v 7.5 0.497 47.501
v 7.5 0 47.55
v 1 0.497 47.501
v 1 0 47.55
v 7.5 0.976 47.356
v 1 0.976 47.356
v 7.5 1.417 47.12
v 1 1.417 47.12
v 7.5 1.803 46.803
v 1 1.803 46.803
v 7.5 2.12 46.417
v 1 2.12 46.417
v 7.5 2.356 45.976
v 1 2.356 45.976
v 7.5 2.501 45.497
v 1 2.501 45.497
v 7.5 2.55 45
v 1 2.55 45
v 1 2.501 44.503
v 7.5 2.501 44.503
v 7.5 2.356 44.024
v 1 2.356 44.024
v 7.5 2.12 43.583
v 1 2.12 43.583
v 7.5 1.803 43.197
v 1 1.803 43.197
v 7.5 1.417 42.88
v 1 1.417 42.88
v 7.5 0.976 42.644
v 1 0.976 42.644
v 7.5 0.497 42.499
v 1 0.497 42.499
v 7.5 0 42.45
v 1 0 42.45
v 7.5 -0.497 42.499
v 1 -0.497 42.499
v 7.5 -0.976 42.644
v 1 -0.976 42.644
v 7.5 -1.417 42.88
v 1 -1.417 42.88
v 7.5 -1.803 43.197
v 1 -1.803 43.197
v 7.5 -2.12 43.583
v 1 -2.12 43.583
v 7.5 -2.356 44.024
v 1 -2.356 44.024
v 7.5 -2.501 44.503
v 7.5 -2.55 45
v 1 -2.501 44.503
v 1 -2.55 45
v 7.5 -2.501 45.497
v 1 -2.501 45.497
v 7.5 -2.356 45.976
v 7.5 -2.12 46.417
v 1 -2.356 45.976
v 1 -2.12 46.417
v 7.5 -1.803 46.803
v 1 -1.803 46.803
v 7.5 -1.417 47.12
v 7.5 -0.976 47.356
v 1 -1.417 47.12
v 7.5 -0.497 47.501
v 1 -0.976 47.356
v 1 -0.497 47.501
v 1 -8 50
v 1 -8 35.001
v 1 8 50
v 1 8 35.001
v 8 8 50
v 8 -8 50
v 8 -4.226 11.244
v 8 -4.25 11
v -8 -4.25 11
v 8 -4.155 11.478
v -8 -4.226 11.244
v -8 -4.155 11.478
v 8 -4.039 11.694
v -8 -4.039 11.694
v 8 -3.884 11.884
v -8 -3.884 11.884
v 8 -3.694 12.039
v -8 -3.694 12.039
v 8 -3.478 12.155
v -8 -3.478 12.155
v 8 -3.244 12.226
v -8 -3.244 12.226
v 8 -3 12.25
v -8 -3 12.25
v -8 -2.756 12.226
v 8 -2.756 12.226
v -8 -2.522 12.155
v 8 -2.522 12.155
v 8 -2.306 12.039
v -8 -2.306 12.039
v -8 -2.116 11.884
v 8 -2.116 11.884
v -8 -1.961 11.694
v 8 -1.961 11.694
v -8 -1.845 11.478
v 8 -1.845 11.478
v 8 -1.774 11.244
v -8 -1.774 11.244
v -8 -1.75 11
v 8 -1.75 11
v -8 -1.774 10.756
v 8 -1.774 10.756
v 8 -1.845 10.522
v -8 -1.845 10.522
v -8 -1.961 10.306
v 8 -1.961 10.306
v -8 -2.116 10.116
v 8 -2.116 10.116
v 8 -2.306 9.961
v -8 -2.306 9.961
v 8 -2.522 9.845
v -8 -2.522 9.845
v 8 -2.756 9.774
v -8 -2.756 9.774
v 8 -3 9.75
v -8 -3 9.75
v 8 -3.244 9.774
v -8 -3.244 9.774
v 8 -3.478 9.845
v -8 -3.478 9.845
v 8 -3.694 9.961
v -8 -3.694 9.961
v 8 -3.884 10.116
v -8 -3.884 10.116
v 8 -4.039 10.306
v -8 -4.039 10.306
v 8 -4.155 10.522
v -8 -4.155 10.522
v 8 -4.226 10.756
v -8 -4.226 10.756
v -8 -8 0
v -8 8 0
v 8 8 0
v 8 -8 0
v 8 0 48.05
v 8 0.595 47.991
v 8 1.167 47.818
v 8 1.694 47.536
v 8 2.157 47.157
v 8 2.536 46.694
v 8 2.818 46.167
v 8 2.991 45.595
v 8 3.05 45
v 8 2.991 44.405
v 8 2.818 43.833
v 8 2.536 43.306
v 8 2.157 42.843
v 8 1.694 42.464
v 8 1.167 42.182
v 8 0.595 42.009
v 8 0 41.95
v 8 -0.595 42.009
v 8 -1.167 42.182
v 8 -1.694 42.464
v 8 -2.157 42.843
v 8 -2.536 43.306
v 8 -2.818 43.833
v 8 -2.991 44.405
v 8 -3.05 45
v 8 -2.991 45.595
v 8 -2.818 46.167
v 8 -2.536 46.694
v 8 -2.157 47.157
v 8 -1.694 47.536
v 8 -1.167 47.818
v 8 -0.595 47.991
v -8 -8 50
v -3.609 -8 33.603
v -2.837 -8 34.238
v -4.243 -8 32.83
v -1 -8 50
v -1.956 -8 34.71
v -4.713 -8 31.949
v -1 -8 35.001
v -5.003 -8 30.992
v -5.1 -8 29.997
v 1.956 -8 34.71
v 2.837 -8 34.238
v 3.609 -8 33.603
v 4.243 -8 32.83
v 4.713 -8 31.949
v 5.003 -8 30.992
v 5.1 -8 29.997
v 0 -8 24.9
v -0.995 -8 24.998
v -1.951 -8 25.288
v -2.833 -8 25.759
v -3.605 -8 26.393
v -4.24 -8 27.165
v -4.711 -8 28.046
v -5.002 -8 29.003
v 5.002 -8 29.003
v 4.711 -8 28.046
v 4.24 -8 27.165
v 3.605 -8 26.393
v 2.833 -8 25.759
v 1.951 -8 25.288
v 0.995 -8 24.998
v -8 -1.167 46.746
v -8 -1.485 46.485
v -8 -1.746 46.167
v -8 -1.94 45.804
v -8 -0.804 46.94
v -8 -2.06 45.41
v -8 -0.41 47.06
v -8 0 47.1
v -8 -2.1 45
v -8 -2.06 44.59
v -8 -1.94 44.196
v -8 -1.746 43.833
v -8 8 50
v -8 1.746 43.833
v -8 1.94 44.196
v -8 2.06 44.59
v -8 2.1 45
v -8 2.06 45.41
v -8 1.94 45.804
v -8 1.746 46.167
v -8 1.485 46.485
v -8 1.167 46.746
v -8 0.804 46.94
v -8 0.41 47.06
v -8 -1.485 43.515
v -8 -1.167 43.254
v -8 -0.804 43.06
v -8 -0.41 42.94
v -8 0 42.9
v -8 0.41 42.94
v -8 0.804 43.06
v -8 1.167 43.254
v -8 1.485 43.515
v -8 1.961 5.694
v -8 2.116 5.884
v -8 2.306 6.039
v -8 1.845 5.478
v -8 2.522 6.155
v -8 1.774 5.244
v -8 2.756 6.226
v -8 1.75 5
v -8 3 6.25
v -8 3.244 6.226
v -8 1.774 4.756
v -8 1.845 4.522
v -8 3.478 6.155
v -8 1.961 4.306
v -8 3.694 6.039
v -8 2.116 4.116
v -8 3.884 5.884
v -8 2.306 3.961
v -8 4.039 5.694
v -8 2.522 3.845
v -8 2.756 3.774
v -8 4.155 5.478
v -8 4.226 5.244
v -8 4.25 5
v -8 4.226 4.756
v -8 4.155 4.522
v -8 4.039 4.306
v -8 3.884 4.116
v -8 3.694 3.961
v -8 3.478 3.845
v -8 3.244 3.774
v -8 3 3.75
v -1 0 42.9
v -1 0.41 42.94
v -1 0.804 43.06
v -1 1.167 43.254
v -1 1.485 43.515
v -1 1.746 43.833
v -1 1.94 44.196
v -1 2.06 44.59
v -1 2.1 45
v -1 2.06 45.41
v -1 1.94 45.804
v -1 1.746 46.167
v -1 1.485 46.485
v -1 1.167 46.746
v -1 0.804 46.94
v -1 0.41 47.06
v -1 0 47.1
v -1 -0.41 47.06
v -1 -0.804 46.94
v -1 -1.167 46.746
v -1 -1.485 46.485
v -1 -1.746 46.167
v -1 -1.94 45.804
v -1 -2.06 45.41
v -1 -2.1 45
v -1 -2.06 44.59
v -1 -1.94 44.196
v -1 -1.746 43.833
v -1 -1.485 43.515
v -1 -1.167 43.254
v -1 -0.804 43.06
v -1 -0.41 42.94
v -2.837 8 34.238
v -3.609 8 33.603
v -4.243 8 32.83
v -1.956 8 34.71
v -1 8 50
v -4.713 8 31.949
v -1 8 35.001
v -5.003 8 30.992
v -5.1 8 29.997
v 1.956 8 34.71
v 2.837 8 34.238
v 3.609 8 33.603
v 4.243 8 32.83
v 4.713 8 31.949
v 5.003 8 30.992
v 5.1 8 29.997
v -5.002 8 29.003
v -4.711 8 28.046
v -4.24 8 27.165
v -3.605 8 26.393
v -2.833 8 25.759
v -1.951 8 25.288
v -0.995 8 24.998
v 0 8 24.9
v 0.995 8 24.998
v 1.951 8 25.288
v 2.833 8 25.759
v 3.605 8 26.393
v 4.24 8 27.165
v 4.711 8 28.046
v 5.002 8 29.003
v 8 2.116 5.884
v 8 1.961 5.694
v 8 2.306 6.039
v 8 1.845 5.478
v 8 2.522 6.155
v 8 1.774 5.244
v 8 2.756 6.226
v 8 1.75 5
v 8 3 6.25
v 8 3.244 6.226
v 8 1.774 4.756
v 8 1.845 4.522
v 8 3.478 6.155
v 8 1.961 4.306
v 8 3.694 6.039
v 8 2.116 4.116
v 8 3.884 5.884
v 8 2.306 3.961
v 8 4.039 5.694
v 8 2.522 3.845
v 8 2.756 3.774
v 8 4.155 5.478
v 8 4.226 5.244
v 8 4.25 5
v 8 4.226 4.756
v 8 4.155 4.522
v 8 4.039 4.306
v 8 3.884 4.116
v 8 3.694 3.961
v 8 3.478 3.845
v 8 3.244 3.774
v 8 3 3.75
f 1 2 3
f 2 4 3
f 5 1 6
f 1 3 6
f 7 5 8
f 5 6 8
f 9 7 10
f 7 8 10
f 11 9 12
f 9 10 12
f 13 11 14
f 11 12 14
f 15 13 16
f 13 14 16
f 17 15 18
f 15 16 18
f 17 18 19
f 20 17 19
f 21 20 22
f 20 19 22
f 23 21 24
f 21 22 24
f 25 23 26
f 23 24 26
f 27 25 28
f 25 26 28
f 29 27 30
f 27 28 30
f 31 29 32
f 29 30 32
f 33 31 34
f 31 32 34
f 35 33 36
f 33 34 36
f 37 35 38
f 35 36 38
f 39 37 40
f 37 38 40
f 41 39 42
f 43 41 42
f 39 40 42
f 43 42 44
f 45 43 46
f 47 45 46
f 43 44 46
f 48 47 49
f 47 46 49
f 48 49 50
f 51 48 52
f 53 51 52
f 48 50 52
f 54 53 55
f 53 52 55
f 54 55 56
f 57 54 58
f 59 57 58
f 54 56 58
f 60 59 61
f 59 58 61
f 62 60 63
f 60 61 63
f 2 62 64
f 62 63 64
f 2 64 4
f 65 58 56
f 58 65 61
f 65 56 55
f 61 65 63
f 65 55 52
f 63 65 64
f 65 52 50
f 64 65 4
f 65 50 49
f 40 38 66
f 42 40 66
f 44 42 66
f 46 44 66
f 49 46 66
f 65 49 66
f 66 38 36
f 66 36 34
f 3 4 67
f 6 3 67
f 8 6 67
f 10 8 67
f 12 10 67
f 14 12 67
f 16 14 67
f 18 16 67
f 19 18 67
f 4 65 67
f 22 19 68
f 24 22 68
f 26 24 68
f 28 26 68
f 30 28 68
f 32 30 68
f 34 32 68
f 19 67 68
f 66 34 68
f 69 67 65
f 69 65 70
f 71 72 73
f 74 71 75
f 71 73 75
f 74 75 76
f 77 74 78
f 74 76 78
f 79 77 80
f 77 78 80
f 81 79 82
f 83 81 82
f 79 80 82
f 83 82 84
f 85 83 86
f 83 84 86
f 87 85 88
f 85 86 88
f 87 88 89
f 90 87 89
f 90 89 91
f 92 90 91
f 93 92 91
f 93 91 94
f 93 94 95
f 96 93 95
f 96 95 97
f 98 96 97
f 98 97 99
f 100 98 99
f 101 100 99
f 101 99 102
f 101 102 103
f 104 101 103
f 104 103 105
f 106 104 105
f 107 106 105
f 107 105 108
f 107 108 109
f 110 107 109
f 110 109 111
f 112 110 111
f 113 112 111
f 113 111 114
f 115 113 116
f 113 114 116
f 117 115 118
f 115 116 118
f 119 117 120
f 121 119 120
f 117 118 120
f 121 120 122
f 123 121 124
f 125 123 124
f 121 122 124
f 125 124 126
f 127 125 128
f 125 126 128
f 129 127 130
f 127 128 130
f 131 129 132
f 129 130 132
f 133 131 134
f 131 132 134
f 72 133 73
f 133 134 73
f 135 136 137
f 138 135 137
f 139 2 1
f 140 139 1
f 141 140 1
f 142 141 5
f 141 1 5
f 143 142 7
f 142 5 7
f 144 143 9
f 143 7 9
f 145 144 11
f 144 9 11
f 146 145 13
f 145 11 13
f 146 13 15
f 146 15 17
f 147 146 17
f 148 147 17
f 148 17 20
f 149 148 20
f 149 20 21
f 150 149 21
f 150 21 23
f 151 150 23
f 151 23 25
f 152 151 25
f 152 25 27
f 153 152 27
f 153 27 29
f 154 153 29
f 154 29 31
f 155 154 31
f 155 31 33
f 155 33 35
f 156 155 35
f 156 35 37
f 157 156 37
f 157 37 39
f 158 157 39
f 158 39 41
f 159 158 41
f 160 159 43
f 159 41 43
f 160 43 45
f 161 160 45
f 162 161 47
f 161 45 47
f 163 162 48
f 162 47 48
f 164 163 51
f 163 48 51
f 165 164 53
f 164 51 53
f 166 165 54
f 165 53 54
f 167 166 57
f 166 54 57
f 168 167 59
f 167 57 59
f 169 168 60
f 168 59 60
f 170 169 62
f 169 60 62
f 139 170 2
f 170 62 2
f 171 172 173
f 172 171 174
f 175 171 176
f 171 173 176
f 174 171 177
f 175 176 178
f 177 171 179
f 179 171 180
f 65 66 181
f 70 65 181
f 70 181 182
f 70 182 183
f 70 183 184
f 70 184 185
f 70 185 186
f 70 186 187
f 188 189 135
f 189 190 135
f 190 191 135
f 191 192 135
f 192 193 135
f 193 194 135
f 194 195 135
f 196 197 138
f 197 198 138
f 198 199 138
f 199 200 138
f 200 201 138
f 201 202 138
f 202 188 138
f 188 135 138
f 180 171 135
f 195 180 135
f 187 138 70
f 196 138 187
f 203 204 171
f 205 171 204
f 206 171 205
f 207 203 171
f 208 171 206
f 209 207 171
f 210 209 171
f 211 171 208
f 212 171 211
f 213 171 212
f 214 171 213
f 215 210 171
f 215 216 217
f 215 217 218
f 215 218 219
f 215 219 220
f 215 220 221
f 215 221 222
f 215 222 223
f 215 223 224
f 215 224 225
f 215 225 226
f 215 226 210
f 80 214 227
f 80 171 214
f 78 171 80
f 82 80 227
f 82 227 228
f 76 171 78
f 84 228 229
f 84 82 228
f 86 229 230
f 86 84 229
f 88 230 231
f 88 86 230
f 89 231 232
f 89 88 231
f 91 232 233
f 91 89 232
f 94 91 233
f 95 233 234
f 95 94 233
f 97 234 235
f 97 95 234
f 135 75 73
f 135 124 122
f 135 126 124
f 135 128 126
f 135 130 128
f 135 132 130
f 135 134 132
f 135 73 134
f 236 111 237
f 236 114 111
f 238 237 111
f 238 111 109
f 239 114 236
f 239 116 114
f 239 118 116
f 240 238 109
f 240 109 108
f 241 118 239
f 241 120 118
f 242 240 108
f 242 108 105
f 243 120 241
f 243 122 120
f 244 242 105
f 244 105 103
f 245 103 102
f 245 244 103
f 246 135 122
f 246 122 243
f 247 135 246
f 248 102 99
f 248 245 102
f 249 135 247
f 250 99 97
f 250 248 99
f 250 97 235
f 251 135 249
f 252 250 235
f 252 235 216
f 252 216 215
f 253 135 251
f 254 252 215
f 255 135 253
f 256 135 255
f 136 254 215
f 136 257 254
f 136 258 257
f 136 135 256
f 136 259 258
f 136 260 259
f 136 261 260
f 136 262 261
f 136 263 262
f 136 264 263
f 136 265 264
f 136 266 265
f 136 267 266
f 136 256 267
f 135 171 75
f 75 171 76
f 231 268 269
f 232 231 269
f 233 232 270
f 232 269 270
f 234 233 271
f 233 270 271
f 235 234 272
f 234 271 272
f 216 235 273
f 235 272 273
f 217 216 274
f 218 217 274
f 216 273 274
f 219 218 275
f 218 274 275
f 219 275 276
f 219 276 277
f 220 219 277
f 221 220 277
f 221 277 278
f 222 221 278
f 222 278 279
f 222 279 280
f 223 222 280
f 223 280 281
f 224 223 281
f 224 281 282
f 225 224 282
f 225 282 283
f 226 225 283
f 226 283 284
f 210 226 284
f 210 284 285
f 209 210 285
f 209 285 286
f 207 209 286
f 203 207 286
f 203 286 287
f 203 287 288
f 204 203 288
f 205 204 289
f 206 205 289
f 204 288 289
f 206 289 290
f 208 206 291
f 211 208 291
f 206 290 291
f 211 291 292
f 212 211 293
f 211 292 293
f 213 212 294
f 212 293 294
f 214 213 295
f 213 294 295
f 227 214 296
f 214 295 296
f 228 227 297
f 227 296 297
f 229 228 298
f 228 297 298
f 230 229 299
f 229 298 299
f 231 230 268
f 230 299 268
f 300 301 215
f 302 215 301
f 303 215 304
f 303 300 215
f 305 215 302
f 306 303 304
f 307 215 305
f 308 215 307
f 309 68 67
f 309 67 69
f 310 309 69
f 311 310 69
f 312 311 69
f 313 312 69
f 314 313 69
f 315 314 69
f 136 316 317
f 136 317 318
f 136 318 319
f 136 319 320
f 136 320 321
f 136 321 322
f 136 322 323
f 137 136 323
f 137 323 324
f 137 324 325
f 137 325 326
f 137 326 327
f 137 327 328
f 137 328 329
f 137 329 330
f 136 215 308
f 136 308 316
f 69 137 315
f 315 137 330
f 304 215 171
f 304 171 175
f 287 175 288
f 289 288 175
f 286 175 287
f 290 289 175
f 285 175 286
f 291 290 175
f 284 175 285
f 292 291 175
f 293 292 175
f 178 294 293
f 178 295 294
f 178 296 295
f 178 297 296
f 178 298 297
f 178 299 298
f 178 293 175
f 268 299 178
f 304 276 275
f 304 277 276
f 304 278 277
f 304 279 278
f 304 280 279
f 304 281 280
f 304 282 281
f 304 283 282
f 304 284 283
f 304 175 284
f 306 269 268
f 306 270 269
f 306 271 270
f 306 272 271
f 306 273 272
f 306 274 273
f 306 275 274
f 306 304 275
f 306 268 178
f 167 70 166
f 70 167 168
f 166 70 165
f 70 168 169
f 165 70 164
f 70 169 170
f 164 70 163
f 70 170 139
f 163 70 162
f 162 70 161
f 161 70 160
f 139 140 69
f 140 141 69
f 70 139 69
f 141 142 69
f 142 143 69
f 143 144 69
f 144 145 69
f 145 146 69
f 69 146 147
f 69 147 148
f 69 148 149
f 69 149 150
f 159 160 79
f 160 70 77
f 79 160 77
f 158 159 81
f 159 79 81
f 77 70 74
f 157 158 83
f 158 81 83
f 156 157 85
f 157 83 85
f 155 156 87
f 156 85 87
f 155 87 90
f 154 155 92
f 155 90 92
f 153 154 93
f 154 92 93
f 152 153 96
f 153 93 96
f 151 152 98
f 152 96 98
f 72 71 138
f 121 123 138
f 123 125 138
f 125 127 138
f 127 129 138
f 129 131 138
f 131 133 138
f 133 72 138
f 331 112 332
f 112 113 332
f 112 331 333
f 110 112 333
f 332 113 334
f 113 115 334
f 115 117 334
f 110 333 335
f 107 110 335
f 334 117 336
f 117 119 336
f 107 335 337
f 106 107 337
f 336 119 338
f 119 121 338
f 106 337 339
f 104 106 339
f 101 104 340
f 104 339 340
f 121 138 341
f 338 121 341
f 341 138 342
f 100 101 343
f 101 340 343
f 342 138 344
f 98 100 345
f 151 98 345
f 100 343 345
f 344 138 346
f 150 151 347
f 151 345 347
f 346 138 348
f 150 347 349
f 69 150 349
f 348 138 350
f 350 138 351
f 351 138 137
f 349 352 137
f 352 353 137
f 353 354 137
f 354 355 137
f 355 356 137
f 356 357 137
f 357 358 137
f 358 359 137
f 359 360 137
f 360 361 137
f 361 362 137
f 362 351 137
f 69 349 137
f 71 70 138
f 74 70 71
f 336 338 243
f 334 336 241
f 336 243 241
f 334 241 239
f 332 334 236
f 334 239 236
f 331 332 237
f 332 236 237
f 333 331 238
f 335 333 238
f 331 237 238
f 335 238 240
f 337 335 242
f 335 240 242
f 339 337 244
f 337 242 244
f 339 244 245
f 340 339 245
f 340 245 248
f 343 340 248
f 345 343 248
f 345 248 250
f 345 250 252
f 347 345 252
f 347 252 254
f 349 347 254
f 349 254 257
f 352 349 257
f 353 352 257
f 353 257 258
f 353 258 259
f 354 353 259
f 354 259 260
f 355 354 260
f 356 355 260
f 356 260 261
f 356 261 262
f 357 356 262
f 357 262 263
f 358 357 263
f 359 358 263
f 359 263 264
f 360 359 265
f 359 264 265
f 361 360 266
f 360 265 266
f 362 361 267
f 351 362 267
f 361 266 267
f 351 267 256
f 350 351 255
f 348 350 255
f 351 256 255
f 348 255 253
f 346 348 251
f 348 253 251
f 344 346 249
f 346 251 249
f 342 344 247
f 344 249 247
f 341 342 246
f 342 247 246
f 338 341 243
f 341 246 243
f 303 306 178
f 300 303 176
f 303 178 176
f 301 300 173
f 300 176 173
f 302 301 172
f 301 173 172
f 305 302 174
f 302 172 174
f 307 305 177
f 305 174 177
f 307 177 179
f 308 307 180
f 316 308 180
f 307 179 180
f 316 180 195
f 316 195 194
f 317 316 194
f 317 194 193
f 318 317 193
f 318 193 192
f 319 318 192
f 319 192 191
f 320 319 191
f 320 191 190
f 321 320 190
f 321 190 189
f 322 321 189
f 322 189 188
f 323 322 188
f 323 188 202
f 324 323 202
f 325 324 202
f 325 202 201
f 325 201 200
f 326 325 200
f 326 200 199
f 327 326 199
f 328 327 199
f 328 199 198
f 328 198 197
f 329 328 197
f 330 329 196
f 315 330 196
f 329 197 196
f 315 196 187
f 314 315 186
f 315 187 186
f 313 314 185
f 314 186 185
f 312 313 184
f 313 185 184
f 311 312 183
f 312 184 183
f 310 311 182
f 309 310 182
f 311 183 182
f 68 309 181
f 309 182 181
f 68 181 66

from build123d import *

# Parameters (mm, degrees)
SKETCH1_W                                 = 16
SKETCH1_H                                 = 16
BASE_DEPTH                                = 50
SKETCH2_W                                 = 2
SKETCH2_H                                 = 16
RODSLOT_DEPTH                             = 54.103672189
F_5_1_5_1_FREE_HOLE_FOR_SCREW_D           = 5.1
F_5_1_5_1_FREE_HOLE_FOR_SCREW_DEPTH       = 7.5
F_5_1_5_1_FREE_HOLE_FOR_SCREW_CSINK_D     = 6.1
F_5_1_5_1_FREE_HOLE_FOR_SCREW_CSINK_ANGLE = 90
F_5_1_5_1_FREE_HOLE_FOR_SCREW_TIP         = 1.056244584
M5X0_8_TAPPED_HOLE_FOR_ROD_SCREW_D        = 4.2
M5X0_8_TAPPED_HOLE_FOR_ROD_SCREW_DEPTH    = 7.6381927
M5X0_8_TAPPED_HOLE_FOR_ROD_SCREW_TIP      = 1.2618073
F_3_1_3_1_SCREW_HOLES_D                   = 2.5
F_10_2_10_2_ROD_HOLE_D                    = 10.2


with BuildPart() as part:
    # Sketch1 → Base (new body)
    with BuildSketch(Plane.XY):
        Rectangle(SKETCH1_W, SKETCH1_H)
    extrude(amount=BASE_DEPTH)

    # Sketch2 → RodSlot (cut, through all)
    with BuildSketch(Plane(origin=(0, 8, 0), x_dir=(1, 0, 0), z_dir=(0, 1, 0))):
        with Locations((0, -42)):
            Rectangle(SKETCH2_W, SKETCH2_H)
    extrude(amount=-RODSLOT_DEPTH, mode=Mode.SUBTRACT)

    # Ø5.1 (5.1) free hole for screw
    with Locations(Plane(origin=(8, 0, 0), x_dir=(0, 0, -1), z_dir=(1, 0, 0))):
        with Locations((-45, 0)):
            CounterSinkHole(F_5_1_5_1_FREE_HOLE_FOR_SCREW_D / 2, F_5_1_5_1_FREE_HOLE_FOR_SCREW_CSINK_D / 2, depth=F_5_1_5_1_FREE_HOLE_FOR_SCREW_DEPTH, counter_sink_angle=F_5_1_5_1_FREE_HOLE_FOR_SCREW_CSINK_ANGLE)
            with Locations((0, 0, -(F_5_1_5_1_FREE_HOLE_FOR_SCREW_DEPTH + F_5_1_5_1_FREE_HOLE_FOR_SCREW_TIP / 2))):  # 135° drill point
                Cone(0, F_5_1_5_1_FREE_HOLE_FOR_SCREW_D / 2, F_5_1_5_1_FREE_HOLE_FOR_SCREW_TIP, mode=Mode.SUBTRACT)

    # M5x0.8 Tapped Hole for rod screw
    with Locations(Plane.ZY.offset(8)):
        with Locations((45, 0)):
            Hole(M5X0_8_TAPPED_HOLE_FOR_ROD_SCREW_D / 2, depth=M5X0_8_TAPPED_HOLE_FOR_ROD_SCREW_DEPTH)
            with Locations((0, 0, -(M5X0_8_TAPPED_HOLE_FOR_ROD_SCREW_DEPTH + M5X0_8_TAPPED_HOLE_FOR_ROD_SCREW_TIP / 2))):  # 118° drill point
                Cone(0, M5X0_8_TAPPED_HOLE_FOR_ROD_SCREW_D / 2, M5X0_8_TAPPED_HOLE_FOR_ROD_SCREW_TIP, mode=Mode.SUBTRACT)

    # Ø3.1 (3.1) screw holes (through all)
    with Locations(Plane.YZ.offset(8)):
        with Locations((3, 5), (-3, 11)):
            Hole(F_3_1_3_1_SCREW_HOLES_D / 2)

    # Ø10.2 (10.2) Rod Hole (through all)
    with Locations(Plane(origin=(0, 8, 0), x_dir=(1, 0, 0), z_dir=(0, 1, 0))):
        with Locations((0, -30)):
            Hole(F_10_2_10_2_ROD_HOLE_D / 2)


solid = part.part
